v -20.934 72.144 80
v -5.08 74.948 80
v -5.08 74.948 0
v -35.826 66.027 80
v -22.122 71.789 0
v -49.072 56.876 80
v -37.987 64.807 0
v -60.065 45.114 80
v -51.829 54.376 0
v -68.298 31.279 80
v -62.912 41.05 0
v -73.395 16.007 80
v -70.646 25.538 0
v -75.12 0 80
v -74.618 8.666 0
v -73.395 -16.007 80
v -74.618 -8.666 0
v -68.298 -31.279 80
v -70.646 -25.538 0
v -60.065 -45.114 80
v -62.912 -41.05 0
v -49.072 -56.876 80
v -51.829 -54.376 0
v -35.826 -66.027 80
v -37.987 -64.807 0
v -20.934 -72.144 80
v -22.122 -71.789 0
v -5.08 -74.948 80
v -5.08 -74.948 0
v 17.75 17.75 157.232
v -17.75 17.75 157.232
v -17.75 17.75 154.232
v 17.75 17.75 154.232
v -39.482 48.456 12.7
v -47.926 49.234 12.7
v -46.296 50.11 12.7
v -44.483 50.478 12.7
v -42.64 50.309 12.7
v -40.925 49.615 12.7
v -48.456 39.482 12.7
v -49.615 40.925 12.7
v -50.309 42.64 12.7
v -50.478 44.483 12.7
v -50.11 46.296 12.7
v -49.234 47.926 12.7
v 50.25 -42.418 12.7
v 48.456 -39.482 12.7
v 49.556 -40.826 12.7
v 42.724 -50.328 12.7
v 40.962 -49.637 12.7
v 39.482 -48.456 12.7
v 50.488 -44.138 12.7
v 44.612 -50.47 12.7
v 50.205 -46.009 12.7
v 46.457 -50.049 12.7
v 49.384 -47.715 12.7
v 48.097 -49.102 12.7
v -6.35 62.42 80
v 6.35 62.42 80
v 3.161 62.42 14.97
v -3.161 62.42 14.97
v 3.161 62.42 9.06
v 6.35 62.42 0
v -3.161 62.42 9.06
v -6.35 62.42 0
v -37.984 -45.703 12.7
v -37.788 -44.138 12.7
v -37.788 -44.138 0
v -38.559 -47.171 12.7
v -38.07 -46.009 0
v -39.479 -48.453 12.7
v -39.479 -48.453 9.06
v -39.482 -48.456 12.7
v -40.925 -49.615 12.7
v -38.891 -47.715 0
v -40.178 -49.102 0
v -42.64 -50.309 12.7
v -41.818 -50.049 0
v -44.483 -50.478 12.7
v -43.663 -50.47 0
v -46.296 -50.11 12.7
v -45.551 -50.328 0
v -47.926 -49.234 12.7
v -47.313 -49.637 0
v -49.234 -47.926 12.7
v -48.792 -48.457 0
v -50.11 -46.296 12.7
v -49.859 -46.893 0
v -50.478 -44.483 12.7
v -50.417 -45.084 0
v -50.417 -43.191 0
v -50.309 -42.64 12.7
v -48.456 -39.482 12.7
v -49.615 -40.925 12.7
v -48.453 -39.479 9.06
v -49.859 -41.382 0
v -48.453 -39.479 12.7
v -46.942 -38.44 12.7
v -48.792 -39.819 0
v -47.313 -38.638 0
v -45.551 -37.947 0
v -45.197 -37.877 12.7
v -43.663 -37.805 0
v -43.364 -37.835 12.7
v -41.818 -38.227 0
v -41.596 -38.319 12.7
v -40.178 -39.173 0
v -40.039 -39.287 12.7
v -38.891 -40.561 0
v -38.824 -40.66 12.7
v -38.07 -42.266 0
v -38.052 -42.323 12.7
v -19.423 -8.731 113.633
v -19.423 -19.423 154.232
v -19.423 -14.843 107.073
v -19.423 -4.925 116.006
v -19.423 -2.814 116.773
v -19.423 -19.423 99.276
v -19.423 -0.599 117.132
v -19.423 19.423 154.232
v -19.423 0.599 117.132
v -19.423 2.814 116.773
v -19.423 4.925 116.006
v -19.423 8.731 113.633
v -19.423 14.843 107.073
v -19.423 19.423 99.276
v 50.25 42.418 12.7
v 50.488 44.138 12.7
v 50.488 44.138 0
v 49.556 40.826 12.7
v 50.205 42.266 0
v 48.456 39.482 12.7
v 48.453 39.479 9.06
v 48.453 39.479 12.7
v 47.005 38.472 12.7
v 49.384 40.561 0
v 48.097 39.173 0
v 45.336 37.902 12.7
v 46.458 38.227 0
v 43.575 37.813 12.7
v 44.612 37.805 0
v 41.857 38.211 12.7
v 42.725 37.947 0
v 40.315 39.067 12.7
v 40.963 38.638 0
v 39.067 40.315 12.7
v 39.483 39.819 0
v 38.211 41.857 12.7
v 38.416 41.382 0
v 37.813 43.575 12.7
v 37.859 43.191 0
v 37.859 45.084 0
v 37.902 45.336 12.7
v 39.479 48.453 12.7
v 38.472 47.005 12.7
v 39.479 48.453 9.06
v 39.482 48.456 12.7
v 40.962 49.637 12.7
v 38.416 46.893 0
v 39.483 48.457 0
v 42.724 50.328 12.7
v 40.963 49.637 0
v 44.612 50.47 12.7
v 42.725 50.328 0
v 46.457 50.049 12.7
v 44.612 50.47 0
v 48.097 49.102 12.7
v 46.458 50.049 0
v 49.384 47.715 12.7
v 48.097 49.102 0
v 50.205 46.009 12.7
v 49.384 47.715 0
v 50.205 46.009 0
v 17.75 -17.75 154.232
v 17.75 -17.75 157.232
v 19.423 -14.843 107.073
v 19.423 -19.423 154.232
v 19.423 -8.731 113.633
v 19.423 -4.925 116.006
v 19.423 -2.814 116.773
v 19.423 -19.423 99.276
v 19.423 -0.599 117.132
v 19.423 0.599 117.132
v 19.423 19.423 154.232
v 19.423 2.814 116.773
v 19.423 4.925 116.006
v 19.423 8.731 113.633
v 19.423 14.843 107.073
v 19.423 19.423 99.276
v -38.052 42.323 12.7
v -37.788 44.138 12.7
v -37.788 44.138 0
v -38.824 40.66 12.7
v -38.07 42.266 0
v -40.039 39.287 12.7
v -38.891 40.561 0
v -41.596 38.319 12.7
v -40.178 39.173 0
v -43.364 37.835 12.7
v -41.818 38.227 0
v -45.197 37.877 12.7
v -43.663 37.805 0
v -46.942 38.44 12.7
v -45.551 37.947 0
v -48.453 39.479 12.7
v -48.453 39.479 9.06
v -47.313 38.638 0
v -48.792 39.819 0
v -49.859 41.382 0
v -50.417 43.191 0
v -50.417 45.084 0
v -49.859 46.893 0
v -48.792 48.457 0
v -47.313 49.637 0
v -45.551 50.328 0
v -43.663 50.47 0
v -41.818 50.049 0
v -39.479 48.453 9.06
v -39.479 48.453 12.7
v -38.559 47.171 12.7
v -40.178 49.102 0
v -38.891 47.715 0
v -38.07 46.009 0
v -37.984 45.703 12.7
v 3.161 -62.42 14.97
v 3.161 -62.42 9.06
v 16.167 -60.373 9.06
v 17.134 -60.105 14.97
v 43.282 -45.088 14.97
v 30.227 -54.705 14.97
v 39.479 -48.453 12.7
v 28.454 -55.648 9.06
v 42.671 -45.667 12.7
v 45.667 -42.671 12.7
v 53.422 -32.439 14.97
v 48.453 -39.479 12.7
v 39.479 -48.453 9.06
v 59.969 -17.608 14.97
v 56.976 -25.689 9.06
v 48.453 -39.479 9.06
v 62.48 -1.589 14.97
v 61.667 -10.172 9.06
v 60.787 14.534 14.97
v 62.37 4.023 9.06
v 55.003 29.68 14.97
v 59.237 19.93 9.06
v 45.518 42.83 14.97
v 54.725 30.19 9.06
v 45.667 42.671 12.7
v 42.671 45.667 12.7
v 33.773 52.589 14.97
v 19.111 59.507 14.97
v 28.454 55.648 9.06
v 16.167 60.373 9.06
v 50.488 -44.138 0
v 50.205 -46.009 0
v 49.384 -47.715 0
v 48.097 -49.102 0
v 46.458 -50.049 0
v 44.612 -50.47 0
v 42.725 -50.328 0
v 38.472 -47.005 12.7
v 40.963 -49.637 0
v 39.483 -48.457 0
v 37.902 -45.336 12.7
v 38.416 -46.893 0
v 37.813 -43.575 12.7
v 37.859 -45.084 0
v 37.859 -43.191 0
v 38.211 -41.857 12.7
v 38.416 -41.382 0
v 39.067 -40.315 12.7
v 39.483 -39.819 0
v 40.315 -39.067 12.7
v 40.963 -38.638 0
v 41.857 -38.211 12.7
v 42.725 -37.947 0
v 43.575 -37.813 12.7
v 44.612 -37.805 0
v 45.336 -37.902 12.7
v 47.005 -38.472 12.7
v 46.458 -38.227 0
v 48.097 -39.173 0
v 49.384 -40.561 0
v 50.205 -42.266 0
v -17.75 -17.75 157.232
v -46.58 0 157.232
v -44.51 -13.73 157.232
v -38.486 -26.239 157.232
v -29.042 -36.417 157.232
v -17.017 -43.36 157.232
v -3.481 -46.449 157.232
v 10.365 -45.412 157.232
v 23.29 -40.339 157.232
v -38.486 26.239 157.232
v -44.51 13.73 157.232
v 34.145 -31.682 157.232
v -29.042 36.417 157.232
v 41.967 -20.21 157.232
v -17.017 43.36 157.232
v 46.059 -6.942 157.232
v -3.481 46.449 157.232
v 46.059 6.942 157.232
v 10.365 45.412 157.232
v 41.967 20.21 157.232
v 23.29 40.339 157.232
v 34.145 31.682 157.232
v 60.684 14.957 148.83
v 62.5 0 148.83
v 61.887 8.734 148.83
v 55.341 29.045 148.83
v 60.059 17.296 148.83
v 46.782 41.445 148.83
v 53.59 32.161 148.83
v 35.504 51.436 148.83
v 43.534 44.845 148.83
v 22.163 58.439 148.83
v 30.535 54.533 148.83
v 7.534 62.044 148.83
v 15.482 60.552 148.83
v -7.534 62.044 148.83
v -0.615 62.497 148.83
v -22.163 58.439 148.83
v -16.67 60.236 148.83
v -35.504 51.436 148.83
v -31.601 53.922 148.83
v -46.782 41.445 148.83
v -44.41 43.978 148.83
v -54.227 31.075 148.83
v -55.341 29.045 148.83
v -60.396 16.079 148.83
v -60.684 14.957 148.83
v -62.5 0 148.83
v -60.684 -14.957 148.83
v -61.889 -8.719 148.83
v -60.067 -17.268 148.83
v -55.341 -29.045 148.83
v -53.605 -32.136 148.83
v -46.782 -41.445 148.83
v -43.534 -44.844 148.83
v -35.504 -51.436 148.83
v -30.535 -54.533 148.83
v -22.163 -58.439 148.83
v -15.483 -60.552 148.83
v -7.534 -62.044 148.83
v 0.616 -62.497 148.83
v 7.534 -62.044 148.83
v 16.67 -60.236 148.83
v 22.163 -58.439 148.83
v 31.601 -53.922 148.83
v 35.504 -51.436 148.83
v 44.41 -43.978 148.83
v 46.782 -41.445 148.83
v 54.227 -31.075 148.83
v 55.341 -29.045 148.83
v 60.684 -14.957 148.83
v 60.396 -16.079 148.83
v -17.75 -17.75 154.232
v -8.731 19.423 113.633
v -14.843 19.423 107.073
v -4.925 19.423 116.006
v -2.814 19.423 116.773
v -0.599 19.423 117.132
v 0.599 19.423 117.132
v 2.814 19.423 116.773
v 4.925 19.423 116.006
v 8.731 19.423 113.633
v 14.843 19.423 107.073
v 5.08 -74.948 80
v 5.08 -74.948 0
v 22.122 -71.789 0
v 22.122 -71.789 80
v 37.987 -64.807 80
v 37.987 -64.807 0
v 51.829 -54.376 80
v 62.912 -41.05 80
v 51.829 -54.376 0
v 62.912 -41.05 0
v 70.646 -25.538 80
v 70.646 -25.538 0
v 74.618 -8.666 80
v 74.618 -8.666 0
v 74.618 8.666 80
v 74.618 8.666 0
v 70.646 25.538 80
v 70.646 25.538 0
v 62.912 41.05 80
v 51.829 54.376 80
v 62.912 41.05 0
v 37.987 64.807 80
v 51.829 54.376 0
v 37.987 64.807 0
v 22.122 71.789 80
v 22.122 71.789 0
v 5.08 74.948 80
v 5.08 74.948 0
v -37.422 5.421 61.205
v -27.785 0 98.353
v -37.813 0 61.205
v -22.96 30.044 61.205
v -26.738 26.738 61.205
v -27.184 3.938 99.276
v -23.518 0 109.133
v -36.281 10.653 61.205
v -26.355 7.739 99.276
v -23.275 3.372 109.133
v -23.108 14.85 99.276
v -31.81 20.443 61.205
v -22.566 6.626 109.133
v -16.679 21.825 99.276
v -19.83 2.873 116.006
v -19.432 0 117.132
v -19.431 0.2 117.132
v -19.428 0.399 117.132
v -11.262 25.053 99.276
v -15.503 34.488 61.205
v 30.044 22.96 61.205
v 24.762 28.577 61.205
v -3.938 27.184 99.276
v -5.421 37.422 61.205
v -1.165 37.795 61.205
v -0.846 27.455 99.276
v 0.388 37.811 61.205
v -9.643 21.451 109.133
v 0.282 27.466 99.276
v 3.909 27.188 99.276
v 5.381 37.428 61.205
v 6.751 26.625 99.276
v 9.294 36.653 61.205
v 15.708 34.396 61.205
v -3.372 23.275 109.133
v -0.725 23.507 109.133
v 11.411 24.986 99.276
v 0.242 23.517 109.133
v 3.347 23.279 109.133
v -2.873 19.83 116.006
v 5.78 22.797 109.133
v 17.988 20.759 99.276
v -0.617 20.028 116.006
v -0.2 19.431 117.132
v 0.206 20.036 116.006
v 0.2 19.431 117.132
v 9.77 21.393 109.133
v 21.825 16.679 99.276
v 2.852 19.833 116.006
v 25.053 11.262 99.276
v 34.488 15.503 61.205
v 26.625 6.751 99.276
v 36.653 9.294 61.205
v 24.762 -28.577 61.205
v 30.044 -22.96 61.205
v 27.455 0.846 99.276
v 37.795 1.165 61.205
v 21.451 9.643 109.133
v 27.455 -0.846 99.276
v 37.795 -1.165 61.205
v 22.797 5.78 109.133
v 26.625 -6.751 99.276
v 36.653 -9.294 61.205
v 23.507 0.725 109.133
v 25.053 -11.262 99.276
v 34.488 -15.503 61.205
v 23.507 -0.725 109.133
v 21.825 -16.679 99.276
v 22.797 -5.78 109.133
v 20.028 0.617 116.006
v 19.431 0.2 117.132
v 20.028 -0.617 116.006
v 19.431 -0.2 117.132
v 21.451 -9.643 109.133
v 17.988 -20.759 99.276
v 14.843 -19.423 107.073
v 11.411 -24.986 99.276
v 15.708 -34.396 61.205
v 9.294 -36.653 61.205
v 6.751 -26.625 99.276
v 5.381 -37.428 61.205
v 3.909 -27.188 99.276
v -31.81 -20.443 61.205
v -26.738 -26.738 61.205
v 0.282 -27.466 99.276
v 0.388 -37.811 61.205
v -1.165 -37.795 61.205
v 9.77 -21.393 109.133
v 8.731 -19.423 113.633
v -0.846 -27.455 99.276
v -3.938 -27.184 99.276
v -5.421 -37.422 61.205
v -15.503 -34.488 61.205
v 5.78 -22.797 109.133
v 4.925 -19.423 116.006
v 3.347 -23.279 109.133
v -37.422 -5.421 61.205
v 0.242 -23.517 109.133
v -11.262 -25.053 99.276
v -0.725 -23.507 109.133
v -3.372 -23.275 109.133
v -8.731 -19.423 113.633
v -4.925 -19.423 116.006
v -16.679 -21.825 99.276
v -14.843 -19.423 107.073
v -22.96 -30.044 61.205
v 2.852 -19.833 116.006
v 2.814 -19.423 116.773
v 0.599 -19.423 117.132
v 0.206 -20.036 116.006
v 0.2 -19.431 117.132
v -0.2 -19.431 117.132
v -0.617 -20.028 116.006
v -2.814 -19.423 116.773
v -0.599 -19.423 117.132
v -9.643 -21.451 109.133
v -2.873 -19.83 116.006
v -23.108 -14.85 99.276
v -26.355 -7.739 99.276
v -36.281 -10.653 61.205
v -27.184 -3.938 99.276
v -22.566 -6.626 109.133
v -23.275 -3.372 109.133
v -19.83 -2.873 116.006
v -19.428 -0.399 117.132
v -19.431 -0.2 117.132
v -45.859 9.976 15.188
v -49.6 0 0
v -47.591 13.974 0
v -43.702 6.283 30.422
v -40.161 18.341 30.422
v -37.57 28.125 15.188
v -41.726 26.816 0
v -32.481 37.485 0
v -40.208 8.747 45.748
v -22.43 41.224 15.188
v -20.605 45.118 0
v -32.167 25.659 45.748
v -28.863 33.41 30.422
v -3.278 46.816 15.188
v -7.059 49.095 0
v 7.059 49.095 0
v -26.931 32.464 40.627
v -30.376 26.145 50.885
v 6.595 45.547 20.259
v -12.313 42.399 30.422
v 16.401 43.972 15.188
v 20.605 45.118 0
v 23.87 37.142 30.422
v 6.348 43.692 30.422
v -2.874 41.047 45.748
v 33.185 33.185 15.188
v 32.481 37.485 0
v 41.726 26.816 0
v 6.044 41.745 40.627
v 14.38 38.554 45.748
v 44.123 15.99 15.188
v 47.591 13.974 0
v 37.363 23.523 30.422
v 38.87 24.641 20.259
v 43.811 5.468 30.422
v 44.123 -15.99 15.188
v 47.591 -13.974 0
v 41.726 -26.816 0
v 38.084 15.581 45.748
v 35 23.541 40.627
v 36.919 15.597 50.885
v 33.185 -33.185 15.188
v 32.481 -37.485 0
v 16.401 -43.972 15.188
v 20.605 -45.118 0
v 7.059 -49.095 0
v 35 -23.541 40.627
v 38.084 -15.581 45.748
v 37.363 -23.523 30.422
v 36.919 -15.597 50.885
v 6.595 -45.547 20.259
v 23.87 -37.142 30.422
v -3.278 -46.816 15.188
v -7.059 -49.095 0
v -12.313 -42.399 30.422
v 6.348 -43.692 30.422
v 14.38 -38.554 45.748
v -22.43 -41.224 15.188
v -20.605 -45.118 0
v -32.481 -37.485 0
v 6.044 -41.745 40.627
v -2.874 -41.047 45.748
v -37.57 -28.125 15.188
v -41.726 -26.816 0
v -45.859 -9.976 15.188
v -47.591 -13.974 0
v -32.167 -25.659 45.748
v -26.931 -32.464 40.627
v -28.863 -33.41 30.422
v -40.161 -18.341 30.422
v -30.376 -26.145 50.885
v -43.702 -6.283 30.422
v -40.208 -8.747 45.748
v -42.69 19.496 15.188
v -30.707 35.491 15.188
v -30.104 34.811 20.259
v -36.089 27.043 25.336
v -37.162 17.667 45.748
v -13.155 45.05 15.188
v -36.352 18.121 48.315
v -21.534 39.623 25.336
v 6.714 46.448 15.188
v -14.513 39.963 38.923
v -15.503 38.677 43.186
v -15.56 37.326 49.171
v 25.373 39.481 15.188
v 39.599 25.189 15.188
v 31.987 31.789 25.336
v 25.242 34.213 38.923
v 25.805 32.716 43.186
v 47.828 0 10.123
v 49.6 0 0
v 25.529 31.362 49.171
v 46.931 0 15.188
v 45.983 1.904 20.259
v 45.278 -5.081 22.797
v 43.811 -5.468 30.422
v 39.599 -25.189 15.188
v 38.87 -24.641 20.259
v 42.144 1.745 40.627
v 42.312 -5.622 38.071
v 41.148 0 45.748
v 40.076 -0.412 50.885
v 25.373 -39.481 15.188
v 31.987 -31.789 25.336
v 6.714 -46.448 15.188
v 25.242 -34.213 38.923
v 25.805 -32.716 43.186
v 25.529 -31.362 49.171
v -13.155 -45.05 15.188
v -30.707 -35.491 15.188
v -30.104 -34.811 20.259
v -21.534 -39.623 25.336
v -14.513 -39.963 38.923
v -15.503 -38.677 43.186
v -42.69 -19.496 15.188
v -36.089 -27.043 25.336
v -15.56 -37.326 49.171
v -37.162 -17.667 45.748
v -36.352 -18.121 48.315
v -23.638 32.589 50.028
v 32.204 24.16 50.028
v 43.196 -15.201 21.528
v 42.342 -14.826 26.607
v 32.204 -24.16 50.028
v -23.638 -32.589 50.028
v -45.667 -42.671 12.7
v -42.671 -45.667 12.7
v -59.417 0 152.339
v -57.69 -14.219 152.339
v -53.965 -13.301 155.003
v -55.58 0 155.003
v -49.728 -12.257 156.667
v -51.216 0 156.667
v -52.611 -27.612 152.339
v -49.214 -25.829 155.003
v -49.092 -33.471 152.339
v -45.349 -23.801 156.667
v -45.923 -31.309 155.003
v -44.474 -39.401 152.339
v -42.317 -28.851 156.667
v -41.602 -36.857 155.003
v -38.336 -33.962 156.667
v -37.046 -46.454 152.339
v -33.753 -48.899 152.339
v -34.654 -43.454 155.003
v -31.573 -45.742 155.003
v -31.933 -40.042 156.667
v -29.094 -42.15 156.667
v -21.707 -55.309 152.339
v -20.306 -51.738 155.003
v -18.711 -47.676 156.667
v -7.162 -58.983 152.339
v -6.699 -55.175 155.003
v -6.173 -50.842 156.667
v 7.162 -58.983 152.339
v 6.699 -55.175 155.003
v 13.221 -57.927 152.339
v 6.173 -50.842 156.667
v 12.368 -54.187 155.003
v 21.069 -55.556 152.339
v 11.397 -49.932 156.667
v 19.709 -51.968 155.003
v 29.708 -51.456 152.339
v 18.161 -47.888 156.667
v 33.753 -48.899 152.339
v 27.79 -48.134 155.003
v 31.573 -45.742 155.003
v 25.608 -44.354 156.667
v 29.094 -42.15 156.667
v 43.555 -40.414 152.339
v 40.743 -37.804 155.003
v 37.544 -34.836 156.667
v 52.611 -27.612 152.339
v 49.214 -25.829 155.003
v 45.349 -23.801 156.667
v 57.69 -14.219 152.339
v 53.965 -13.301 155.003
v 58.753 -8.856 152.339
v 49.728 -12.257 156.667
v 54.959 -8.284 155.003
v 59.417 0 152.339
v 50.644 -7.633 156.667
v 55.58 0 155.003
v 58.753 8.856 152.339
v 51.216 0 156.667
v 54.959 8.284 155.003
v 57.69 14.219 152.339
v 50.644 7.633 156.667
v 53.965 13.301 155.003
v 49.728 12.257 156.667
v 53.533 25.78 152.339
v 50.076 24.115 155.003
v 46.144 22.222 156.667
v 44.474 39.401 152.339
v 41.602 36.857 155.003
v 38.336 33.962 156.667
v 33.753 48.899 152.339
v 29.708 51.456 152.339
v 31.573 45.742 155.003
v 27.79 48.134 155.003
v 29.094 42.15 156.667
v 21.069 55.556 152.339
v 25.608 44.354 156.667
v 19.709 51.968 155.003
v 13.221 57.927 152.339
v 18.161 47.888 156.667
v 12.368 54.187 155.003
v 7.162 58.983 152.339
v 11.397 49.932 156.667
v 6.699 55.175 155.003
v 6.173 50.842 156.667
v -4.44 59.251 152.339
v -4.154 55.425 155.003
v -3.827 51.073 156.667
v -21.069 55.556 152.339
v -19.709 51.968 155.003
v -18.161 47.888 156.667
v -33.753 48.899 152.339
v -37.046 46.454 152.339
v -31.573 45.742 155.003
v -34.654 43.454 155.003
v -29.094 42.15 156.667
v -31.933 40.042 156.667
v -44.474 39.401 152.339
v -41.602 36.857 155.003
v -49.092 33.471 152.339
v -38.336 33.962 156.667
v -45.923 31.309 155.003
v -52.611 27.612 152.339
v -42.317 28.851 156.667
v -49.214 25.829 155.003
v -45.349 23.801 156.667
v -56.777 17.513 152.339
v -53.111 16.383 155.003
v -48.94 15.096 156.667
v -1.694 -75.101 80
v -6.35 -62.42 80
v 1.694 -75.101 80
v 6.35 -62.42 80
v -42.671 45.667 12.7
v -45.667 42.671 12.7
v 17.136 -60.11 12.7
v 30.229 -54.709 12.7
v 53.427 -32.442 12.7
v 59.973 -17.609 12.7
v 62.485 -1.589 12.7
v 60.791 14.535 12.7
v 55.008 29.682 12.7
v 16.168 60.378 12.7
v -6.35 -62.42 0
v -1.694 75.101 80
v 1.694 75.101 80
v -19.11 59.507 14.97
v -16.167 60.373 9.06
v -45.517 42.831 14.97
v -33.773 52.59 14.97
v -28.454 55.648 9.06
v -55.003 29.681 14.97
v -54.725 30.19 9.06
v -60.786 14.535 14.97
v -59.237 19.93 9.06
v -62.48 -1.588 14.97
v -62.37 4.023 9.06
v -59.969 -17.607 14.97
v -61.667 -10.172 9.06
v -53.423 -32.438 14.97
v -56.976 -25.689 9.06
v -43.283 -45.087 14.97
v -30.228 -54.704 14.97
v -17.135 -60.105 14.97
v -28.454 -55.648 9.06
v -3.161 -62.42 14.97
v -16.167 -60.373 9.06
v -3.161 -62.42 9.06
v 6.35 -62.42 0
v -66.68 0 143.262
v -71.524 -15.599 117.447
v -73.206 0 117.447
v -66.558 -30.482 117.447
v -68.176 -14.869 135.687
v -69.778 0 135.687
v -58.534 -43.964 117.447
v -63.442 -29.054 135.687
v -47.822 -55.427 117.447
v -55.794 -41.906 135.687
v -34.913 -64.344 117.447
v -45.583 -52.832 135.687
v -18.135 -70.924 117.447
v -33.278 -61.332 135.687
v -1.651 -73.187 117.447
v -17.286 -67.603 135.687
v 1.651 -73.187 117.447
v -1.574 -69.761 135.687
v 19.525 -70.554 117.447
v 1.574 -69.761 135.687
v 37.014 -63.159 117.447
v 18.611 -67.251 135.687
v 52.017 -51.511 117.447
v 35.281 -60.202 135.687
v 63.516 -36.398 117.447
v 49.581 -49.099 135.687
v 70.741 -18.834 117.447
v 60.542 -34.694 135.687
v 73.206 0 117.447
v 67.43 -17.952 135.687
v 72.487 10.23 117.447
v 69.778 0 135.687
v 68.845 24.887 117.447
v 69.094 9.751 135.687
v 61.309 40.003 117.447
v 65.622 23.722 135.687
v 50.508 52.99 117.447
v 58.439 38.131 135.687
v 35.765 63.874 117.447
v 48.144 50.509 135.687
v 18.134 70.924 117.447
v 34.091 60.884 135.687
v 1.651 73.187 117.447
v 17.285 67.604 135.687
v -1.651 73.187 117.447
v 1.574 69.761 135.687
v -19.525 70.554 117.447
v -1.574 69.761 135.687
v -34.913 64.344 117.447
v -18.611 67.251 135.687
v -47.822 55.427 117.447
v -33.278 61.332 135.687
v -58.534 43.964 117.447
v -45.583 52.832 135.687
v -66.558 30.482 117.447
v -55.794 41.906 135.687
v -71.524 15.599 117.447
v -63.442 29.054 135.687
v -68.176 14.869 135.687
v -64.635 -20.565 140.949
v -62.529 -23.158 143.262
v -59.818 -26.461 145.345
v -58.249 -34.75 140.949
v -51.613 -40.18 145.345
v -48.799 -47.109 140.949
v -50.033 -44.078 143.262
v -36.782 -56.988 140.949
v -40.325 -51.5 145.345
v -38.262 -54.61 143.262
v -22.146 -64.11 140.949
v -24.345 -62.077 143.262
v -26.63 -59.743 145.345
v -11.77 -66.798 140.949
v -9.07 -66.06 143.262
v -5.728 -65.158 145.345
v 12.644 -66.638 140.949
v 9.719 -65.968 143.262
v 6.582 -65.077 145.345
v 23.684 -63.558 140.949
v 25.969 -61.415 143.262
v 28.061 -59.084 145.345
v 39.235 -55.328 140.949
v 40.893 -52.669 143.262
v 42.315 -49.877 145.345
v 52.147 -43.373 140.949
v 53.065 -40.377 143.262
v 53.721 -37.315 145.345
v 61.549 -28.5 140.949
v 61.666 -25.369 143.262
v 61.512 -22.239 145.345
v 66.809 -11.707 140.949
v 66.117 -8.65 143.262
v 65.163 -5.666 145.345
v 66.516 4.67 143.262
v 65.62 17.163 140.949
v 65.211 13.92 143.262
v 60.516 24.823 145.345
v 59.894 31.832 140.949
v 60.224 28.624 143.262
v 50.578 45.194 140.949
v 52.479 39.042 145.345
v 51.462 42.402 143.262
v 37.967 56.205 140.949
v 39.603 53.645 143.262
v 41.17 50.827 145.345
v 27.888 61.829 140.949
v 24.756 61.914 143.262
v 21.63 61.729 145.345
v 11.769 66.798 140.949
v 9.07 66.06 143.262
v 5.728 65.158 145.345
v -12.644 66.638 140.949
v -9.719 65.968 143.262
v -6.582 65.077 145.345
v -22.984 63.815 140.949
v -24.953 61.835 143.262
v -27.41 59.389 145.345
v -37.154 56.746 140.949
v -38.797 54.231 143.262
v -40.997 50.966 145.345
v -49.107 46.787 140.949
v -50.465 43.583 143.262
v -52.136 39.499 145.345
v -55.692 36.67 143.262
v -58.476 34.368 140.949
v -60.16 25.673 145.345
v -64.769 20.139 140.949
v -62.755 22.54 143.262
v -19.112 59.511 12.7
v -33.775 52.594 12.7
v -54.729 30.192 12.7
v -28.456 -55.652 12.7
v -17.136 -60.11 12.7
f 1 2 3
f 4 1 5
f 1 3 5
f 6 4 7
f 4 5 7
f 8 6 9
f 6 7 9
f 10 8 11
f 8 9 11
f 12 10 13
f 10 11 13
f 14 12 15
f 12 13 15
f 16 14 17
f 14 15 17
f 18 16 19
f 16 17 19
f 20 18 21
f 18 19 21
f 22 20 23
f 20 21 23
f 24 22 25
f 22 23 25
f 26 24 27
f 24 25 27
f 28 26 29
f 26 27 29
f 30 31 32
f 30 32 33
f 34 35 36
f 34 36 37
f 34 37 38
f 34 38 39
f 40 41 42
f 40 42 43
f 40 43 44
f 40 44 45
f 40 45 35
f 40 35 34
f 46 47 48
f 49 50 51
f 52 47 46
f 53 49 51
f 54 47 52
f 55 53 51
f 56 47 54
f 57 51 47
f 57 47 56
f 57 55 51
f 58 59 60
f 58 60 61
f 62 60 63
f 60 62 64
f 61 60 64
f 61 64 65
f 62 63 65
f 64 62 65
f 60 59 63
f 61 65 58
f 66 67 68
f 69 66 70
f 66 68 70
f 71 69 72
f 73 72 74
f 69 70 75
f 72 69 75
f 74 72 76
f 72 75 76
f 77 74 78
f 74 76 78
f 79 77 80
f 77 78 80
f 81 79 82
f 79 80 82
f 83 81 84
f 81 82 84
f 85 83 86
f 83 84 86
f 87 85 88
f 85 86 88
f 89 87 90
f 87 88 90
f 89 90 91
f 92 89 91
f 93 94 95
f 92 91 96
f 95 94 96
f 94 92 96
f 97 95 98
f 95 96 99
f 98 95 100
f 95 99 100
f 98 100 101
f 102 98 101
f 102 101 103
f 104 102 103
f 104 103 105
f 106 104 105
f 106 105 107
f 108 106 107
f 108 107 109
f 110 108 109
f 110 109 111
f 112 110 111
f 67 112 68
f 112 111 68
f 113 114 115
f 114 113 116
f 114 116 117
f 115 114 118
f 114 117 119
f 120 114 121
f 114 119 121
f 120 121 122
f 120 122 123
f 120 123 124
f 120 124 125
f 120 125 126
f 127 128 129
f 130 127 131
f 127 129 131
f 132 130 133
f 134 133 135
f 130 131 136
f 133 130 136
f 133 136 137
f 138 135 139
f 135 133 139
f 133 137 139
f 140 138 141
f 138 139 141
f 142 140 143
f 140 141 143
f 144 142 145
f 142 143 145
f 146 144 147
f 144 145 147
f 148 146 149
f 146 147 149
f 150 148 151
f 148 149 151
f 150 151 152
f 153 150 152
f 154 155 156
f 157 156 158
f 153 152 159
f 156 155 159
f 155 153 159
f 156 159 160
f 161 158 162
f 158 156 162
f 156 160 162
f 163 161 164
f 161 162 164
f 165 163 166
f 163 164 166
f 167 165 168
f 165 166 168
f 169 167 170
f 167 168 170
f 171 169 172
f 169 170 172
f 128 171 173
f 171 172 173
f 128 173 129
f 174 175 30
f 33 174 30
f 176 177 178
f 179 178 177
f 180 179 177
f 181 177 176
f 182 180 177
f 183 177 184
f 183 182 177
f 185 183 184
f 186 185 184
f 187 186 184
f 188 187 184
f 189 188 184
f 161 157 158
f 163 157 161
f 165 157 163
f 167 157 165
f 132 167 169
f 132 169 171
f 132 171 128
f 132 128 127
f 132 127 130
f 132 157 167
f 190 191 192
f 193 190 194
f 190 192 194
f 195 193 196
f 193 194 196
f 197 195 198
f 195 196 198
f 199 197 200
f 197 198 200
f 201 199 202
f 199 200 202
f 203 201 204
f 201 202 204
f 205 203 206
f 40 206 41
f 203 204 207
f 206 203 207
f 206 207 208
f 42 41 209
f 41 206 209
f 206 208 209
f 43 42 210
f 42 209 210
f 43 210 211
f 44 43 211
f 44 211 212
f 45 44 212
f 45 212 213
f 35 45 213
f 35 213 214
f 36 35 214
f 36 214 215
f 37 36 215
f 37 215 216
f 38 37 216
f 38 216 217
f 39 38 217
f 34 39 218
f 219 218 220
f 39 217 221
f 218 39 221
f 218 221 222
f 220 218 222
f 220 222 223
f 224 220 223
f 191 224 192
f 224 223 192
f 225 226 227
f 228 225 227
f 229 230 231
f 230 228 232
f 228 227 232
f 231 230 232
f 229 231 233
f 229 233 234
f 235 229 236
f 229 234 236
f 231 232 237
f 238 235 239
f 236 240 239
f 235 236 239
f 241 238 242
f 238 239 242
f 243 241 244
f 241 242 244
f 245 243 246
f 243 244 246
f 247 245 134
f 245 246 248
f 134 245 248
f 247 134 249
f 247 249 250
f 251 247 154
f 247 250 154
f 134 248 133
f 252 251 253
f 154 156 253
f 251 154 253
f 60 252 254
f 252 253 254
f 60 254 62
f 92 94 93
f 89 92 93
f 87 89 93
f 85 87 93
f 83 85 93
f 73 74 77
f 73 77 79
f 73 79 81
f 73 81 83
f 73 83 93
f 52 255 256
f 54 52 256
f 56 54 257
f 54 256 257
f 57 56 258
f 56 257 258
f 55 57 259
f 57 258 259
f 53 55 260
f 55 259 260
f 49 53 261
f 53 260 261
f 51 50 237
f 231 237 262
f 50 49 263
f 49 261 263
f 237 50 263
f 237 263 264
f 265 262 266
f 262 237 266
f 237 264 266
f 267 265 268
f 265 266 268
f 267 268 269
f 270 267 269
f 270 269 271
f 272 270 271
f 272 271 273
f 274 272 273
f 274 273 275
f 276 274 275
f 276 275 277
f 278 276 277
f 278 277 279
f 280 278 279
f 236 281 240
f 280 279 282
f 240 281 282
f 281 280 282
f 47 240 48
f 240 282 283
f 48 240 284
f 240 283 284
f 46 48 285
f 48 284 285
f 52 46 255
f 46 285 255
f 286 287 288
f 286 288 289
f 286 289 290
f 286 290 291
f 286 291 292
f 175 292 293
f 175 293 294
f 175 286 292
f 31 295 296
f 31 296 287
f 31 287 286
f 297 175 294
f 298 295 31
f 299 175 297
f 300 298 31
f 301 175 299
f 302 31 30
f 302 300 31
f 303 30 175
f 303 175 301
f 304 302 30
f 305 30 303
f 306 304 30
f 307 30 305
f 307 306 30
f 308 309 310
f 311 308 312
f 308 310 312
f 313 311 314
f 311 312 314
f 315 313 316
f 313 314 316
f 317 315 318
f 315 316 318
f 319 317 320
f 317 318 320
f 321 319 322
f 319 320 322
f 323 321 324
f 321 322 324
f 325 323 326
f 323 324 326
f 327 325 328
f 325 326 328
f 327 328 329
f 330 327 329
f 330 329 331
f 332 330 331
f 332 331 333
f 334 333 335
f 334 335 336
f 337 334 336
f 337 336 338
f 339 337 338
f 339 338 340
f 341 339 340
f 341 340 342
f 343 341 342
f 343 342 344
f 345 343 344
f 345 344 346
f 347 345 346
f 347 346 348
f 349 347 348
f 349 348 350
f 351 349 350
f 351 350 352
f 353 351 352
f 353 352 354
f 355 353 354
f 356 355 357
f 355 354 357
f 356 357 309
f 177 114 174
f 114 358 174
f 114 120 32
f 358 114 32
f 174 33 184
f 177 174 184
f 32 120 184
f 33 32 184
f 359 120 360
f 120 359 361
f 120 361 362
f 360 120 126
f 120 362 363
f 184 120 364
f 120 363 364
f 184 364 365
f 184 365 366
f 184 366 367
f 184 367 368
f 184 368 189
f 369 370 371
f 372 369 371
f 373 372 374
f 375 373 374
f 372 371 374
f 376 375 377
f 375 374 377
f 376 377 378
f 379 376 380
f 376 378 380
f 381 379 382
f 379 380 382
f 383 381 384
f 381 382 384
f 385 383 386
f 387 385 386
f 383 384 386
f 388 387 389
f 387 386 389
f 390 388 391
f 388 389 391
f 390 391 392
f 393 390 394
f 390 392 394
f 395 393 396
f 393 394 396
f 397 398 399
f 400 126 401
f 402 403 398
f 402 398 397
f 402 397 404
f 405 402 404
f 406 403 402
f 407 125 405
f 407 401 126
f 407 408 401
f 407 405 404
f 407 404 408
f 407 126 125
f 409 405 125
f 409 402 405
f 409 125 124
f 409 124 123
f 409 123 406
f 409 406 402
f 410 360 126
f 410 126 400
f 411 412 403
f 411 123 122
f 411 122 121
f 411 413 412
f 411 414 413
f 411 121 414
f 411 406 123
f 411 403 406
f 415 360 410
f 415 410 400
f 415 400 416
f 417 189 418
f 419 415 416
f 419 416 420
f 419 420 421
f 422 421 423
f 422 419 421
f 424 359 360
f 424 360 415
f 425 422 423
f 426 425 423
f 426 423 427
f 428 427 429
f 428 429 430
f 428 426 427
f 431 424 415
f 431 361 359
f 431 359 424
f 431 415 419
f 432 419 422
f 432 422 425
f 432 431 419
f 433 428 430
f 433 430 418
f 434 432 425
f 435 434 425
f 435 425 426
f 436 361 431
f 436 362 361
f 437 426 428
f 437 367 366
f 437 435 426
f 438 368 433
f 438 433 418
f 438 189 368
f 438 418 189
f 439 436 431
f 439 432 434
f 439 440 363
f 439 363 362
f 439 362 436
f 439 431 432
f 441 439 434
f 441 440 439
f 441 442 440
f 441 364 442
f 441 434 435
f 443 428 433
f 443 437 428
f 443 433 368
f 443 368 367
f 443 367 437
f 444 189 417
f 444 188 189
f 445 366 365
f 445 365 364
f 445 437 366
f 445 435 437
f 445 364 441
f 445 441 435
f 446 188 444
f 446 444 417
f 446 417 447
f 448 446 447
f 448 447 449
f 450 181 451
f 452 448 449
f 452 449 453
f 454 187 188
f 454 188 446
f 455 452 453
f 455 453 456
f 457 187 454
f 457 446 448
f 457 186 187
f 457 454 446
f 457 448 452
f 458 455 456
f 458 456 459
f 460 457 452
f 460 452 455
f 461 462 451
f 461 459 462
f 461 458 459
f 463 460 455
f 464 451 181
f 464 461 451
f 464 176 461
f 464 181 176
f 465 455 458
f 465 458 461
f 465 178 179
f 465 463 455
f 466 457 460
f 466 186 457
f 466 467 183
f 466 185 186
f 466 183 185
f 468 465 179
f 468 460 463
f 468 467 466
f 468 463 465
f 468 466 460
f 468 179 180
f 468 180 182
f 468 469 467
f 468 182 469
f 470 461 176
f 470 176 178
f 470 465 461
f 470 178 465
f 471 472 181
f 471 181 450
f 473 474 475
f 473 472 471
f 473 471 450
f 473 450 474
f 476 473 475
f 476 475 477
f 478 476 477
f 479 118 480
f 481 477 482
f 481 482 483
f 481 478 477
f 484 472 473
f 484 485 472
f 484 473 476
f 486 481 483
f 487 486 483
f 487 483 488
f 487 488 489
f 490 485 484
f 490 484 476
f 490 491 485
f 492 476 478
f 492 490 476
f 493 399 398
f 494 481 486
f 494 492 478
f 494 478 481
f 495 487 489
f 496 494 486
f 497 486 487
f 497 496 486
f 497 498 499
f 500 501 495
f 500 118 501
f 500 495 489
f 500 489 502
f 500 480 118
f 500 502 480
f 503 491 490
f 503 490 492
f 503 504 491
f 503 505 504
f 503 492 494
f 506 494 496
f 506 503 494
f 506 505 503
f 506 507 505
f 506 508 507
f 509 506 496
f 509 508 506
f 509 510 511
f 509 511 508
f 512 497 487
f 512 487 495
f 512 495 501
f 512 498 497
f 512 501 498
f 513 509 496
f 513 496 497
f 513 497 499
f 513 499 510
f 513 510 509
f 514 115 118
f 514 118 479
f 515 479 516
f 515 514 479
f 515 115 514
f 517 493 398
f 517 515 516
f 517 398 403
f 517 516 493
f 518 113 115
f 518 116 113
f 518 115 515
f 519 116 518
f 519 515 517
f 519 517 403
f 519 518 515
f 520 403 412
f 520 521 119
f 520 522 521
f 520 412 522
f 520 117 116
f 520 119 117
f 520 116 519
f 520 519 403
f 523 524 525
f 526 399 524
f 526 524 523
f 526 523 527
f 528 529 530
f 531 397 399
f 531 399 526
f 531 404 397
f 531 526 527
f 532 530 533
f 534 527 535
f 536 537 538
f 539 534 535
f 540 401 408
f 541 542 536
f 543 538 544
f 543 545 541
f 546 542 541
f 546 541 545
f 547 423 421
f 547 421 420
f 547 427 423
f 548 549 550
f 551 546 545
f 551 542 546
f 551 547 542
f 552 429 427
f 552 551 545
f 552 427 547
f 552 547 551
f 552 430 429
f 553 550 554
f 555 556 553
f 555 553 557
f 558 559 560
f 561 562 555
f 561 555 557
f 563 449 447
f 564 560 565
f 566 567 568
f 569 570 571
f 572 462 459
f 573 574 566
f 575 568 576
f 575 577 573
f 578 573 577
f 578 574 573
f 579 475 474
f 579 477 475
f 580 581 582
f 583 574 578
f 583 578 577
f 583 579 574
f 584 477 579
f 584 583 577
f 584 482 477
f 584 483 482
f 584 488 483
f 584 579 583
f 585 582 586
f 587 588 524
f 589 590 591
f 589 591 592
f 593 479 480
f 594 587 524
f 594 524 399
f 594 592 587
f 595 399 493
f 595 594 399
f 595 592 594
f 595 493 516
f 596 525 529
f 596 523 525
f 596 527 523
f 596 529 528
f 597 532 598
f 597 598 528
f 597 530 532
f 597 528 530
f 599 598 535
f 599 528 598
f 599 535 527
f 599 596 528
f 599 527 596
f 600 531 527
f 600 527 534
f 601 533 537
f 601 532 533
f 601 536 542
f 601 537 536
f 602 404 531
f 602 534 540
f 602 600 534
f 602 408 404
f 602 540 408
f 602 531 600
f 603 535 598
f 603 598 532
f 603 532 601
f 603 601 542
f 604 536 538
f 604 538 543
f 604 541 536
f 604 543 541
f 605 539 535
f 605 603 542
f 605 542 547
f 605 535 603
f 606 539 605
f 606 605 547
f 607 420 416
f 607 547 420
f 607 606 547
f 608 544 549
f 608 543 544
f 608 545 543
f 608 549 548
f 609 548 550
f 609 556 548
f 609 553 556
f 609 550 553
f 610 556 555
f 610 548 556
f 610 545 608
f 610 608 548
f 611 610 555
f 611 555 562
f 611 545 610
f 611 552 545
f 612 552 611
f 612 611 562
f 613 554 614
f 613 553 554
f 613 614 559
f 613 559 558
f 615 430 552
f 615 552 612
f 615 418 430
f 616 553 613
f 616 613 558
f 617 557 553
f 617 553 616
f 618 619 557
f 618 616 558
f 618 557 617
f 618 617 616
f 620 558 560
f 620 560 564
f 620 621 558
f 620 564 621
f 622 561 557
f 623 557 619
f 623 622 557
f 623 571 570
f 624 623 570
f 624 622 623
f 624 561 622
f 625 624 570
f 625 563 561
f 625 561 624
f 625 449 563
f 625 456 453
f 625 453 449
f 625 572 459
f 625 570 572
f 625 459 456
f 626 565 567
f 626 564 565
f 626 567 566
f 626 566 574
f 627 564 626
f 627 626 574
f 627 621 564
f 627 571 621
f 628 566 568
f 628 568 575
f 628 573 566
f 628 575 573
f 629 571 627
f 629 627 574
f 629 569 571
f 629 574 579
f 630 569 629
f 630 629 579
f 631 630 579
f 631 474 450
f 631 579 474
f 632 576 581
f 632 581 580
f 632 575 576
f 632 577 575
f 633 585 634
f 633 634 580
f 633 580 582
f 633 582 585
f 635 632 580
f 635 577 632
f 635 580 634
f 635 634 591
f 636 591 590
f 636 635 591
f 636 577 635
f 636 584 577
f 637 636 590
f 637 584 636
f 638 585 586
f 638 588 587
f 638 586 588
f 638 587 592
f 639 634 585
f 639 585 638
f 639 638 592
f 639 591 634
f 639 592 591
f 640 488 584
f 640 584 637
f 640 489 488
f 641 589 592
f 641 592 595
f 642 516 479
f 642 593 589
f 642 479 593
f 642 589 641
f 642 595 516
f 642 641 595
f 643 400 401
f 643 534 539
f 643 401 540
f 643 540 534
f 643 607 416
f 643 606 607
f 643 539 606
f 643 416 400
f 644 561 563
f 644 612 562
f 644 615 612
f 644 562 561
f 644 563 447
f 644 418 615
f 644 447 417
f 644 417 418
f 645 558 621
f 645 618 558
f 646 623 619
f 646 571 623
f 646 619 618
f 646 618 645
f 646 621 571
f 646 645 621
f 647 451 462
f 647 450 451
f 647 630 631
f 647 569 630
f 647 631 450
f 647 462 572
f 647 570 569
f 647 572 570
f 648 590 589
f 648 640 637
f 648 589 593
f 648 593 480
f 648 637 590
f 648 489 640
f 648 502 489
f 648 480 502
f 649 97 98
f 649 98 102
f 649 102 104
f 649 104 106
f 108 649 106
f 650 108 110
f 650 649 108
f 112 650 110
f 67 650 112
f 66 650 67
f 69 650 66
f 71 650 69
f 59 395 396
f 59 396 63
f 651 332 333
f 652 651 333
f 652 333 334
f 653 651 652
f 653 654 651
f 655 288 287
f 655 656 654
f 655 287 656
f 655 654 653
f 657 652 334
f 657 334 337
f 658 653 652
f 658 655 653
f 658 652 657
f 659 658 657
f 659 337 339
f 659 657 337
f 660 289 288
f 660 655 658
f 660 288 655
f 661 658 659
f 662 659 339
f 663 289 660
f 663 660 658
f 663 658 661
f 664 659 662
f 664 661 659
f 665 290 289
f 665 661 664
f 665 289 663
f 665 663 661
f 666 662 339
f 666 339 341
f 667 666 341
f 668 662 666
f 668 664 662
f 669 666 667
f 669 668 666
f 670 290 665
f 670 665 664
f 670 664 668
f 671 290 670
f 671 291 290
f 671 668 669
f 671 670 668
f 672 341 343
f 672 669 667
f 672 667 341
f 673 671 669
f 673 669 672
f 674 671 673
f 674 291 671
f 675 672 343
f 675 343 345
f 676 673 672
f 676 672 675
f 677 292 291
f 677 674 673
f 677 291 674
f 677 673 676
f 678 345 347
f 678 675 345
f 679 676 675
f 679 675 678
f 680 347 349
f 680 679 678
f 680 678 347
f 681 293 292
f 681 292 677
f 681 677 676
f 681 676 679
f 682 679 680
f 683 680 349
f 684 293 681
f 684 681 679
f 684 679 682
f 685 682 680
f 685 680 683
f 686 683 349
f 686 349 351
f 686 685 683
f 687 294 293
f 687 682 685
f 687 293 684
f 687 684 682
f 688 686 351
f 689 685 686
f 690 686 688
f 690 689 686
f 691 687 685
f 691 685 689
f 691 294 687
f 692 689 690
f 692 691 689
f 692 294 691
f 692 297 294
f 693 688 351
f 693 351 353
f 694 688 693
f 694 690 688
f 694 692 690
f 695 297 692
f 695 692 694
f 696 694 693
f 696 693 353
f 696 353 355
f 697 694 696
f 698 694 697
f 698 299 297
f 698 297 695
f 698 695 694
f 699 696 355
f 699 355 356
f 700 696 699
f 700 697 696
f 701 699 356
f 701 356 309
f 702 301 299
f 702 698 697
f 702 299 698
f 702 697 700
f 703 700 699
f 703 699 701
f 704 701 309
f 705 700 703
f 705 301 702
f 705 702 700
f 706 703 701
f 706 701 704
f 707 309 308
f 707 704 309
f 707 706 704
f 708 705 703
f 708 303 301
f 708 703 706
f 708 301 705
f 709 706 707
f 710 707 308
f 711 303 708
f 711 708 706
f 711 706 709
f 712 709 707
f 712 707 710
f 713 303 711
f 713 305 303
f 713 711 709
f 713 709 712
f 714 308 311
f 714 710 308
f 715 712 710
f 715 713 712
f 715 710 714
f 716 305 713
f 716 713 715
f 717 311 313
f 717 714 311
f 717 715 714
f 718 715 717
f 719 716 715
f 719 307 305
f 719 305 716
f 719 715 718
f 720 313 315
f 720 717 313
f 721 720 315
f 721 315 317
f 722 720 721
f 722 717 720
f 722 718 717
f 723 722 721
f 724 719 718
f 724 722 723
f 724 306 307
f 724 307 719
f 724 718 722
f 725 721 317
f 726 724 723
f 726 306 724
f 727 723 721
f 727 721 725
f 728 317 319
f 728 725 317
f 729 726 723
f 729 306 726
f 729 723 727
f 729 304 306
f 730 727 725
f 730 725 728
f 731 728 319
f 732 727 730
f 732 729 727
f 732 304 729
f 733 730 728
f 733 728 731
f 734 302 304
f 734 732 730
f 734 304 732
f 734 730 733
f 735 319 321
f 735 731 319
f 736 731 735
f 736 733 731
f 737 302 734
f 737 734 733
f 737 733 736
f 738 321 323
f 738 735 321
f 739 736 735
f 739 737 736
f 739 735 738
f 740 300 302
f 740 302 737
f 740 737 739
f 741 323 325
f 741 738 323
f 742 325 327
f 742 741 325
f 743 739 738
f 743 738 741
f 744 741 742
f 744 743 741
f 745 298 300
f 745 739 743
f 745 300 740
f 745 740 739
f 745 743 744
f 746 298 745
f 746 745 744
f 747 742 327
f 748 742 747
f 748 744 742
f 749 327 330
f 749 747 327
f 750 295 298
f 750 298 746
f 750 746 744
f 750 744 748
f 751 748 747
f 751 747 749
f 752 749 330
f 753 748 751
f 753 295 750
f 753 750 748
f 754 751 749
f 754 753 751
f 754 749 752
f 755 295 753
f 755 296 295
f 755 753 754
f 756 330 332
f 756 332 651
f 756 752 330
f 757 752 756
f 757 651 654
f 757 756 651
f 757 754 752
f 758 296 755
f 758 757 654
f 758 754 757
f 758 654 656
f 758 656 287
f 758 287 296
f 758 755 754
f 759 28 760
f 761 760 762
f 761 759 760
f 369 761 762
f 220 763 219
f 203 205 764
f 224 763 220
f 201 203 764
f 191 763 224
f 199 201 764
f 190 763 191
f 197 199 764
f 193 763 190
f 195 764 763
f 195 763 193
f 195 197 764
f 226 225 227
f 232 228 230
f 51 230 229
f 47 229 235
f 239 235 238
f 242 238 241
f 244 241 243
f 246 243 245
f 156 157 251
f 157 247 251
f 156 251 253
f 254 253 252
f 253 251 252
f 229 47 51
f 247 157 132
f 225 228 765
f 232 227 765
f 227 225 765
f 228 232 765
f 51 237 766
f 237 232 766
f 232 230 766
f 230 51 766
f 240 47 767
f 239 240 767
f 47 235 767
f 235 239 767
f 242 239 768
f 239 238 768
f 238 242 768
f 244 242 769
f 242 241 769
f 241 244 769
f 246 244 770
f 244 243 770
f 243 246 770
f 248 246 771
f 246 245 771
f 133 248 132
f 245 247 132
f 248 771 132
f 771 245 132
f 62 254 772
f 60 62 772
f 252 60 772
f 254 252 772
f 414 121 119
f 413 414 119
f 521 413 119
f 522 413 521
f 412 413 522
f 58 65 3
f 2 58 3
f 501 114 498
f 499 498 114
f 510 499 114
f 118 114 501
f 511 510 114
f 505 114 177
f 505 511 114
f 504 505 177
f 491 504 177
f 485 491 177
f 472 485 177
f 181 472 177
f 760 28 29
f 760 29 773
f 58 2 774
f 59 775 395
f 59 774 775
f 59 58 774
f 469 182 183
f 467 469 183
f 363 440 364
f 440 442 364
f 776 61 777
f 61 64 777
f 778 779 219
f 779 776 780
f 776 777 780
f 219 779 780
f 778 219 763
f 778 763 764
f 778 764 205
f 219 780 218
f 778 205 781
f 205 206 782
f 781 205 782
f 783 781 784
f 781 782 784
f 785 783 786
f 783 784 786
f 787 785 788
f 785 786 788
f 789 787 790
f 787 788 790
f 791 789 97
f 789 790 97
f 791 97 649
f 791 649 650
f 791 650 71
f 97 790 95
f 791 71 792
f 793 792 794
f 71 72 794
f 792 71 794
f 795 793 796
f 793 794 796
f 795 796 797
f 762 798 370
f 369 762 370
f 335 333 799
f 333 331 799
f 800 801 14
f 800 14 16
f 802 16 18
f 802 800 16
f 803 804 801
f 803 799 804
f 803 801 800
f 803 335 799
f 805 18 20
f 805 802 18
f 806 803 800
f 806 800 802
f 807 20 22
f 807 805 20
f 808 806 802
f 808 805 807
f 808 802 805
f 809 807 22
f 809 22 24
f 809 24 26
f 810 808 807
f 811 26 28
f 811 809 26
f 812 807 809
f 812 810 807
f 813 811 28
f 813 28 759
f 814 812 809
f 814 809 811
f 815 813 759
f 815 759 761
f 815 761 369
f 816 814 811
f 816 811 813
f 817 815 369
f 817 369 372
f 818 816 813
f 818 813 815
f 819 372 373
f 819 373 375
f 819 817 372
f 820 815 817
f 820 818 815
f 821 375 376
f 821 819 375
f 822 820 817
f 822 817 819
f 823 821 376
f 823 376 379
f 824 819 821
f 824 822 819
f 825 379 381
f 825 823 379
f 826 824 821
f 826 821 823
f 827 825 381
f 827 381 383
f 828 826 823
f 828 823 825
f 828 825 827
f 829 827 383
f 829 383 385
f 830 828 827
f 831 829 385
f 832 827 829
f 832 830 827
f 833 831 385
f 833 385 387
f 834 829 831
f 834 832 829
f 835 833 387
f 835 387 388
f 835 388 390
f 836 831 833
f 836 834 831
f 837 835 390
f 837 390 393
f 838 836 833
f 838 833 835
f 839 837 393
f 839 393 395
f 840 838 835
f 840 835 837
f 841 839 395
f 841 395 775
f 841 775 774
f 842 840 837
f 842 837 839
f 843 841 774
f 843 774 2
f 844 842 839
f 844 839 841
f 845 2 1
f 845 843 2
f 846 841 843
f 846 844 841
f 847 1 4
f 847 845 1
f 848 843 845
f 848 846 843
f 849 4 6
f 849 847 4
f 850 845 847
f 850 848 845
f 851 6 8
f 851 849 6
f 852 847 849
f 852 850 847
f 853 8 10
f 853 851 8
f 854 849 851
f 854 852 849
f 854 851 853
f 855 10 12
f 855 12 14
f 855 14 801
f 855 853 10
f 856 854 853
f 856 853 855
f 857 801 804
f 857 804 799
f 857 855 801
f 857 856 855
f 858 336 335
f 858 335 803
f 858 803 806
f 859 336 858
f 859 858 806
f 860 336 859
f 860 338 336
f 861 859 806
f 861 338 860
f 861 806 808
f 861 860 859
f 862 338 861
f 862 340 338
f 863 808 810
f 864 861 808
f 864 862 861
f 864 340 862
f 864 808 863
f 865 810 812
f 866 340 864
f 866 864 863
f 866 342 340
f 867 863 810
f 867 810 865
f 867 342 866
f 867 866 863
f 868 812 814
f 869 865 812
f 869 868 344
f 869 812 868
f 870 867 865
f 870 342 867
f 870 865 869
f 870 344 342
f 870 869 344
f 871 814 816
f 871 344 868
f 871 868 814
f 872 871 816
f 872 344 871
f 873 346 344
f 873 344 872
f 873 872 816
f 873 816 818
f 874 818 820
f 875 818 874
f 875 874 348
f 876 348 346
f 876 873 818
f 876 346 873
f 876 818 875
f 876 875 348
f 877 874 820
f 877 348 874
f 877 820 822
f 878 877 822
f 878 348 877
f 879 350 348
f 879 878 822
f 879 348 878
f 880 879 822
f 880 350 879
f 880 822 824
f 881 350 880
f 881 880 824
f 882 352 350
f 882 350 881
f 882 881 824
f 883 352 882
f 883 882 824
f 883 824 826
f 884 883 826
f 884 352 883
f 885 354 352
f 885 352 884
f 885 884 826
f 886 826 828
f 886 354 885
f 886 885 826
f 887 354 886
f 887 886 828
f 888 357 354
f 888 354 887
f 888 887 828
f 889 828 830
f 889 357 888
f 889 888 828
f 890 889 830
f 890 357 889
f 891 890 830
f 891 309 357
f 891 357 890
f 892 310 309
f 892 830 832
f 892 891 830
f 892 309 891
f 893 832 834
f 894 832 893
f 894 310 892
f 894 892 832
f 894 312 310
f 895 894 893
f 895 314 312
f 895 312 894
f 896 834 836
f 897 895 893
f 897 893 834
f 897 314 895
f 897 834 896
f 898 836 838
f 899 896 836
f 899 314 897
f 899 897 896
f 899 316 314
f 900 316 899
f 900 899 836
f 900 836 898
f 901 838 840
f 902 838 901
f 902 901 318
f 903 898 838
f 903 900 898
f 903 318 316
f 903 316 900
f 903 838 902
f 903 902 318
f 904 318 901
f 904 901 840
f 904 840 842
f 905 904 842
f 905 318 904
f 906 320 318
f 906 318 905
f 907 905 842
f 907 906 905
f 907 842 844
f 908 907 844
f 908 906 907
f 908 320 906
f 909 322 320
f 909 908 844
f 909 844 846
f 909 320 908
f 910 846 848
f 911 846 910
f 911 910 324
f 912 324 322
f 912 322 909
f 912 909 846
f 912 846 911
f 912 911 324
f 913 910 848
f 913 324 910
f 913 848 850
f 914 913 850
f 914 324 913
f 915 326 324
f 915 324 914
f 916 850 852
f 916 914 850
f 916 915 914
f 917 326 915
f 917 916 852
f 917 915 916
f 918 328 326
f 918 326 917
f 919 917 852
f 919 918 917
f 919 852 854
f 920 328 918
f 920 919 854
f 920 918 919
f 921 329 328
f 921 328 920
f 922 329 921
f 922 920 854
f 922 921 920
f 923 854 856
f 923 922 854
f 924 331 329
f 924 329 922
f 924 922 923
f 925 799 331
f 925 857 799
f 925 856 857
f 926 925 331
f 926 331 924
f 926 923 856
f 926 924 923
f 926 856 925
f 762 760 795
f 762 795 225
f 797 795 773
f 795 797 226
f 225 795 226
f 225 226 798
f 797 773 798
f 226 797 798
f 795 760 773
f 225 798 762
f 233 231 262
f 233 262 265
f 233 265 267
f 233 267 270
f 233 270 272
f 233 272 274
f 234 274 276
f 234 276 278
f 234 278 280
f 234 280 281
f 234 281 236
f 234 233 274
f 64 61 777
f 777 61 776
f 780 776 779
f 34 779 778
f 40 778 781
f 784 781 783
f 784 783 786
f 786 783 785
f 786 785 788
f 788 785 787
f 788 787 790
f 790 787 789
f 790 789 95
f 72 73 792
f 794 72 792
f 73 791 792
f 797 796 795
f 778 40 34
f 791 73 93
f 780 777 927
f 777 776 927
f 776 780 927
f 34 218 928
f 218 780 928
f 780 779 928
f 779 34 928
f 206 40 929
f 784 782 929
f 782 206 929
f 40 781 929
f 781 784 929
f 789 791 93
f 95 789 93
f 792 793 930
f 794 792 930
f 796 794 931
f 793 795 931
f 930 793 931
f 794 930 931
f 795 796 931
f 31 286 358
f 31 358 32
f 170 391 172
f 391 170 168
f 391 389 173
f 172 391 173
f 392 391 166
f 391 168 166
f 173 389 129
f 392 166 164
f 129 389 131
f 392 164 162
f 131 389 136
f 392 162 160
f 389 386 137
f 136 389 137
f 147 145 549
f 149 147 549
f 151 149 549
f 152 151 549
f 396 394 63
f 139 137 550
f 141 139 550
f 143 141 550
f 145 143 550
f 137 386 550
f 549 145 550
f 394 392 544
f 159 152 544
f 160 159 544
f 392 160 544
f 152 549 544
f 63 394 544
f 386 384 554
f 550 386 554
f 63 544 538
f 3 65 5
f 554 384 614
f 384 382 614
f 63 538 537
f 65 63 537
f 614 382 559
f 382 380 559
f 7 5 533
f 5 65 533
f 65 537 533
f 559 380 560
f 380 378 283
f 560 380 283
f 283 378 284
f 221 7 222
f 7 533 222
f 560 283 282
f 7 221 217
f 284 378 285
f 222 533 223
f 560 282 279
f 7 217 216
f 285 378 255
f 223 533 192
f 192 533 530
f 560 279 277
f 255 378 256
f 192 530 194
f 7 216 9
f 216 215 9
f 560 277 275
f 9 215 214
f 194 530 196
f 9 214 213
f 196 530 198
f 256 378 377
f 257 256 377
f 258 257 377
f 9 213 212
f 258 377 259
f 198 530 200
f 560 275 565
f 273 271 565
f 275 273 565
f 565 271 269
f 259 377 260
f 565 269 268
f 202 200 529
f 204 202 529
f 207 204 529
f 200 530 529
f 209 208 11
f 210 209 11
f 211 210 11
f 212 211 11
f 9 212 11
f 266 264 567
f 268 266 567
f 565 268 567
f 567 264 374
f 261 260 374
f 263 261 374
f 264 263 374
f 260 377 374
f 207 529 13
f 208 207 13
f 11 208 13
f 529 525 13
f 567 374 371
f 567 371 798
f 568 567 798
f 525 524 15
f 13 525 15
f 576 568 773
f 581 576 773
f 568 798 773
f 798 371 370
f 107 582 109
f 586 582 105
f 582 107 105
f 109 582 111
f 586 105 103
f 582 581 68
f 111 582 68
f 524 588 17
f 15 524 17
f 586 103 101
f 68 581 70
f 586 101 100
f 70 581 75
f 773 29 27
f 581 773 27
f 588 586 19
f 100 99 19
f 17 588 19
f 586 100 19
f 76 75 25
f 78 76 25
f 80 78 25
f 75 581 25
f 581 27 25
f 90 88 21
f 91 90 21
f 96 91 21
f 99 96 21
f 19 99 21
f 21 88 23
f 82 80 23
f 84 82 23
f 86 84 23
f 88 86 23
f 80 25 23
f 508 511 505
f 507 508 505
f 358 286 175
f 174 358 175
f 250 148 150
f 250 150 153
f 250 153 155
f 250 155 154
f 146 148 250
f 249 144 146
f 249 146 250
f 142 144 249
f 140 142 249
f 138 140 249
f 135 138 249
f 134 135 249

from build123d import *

# Parameters (mm, degrees)
F2_R      = 62.5
F2_W      = 38.8455463488
F2_H      = 38.8455463488
F3_DEPTH  = 157.39
F8_W      = 38.8455463488
F8_H      = 38.8455463488
F8_W_2    = 35.5
F8_H_2    = 35.5
F9_DEPTH  = 3
F11_DEPTH = 80
F12_R     = 6.35
F13_DEPTH = 12.7


# Not quite as in the source:
# - a feature names something its author has since deleted; it is built from what else it names


with BuildPart() as f1:
    # F0 (on Front) → F1 (revolve)
    with BuildSketch(Plane.XZ):
        with BuildLine():
            ThreePointArc((-62.42, 0), (-60.0517541619, 76.462422463), (-50.8, 152.4))
            Line((-50.8, 152.4), (-45.72, 152.4))
            Line((-45.72, 152.4), (-45.72, 157.4))
            add(Edge.make_bspline(
                [(-75.12, 80), (-74.447497537, 106.2833289956), (-73.373072159, 148.2749606206), (-53.2483071241, 154.9157878093), (-45.72, 157.4)],
                knots=[0, 0, 0, 0, 0.6259182599, 1, 1, 1, 1], degree=3))
            Line((-75.12, 80), (-75.12, 0))
            Line((-75.12, 0), (-62.42, 0))
        make_face()
    revolve(axis=Axis((0, 0, 76.2), (0, 0, 1)))

    # F2 (on Top) → F3 (join)
    with BuildSketch(Plane.XY):
        Circle(F2_R)
        Rectangle(F2_W, F2_H, mode=Mode.SUBTRACT)
    extrude(amount=F3_DEPTH)

    # F5 (on Front) → F6 (revolve, cut)
    with BuildSketch(Plane.XZ):
        with BuildLine():
            Line((-19.432, 0), (0, 0))
            Line((0, 0), (0, 117.132))
            Line((0, 117.132), (-19.432, 117.132))
            add(Edge.make_bspline(
                [(-49.6, 0), (-46.3600523587, 18.5581395922), (-40.1579876774, 54.0830291461), (-27.905682613, 101.3967550255), (-21.7260374714, 112.8720762759), (-19.432, 117.132)],
                knots=[0, 0, 0, 0, 0.4074955134, 0.7800476463, 1, 1, 1, 1], degree=3))
            Line((-49.6, 0), (-19.432, 0))
        make_face()
    revolve(axis=Axis((0, 0, 58.566), (0, 0, -1)), mode=Mode.SUBTRACT)

    # F4 (on Front) → F7 (revolve, cut)
    with BuildSketch(Plane.XZ):
        with BuildLine():
            Line((-59.5792606473, 163.4935438633), (-68.9641386271, 155.4379612207))
            Line((-68.9641386271, 155.4379612207), (-62.5000447035, 148.8302797079))
            ThreePointArc((-62.5000447035, 148.8302797079), (-55.5803045517, 155.0029325492), (-46.5795062482, 157.2322994471))
            Line((-46.5795062482, 157.2322994471), (0, 157.2322994471))
            Line((0, 157.2322994471), (0, 165.5570715666))
            Line((0, 165.5570715666), (-59.5792606473, 163.4935438633))
        make_face()
    revolve(axis=Axis((0, 0, 161.3946855068), (0, 0, 1)), mode=Mode.SUBTRACT)

    # F8 (on face) → F9 (join)
    with BuildSketch(Plane.XY.offset(157.2322994471)):
        Rectangle(F8_W, F8_H)
        Rectangle(F8_W_2, F8_H_2, mode=Mode.SUBTRACT)
    extrude(amount=-F9_DEPTH)

    # F10 (on face) → F11 (cut)
    with BuildSketch(Plane(origin=(0, 0, 0), x_dir=(1, 0, 0), z_dir=(0, 0, -1))):
        with BuildLine():
            Line((-6.35, 62.42), (6.35, 62.42))
            Line((6.35, 62.42), (5.08, 74.9480353312))
            ThreePointArc((5.08, 74.9480353312), (0, 75.12), (-5.08, 74.9480353312))
            Line((-5.08, 74.9480353312), (-6.35, 62.42))
        make_face()
        with BuildLine():
            ThreePointArc((-5.08, 74.9480353312), (0, 75.12), (5.08, 74.9480353312))
            ThreePointArc((5.08, 74.9480353312), (0, 79.5390976959), (-5.08, 74.9480353312))
        make_face()
        with BuildLine():
            Line((-6.35, -62.42), (-5.08, -74.9480353312))
            ThreePointArc((-5.08, -74.9480353312), (0, -75.12), (5.08, -74.9480353312))
            Line((5.08, -74.9480353312), (6.35, -62.42))
            Line((6.35, -62.42), (-6.35, -62.42))
        make_face()
        with BuildLine():
            ThreePointArc((5.08, -74.9480353312), (0, -75.12), (-5.08, -74.9480353312))
            ThreePointArc((-5.08, -74.9480353312), (0, -79.5390976959), (5.08, -74.9480353312))
        make_face()
    extrude(amount=-F11_DEPTH, mode=Mode.SUBTRACT)

    # F12 (on face) → F13 (cut)
    with BuildSketch(Plane(origin=(0, 0, 0), x_dir=(1, 0, 0), z_dir=(0, 0, -1))):
        with Locations((-44.1376052817, 44.1376052817)):
            Circle(F12_R)
        with Locations((44.1376052817, 44.1376052817)):
            Circle(F12_R)
        with Locations((44.1376052817, -44.1376052817)):
            Circle(F12_R)
        with Locations((-44.1376052817, -44.1376052817)):
            Circle(F12_R)
    extrude(amount=-F13_DEPTH, mode=Mode.SUBTRACT)


solid = f1.part
